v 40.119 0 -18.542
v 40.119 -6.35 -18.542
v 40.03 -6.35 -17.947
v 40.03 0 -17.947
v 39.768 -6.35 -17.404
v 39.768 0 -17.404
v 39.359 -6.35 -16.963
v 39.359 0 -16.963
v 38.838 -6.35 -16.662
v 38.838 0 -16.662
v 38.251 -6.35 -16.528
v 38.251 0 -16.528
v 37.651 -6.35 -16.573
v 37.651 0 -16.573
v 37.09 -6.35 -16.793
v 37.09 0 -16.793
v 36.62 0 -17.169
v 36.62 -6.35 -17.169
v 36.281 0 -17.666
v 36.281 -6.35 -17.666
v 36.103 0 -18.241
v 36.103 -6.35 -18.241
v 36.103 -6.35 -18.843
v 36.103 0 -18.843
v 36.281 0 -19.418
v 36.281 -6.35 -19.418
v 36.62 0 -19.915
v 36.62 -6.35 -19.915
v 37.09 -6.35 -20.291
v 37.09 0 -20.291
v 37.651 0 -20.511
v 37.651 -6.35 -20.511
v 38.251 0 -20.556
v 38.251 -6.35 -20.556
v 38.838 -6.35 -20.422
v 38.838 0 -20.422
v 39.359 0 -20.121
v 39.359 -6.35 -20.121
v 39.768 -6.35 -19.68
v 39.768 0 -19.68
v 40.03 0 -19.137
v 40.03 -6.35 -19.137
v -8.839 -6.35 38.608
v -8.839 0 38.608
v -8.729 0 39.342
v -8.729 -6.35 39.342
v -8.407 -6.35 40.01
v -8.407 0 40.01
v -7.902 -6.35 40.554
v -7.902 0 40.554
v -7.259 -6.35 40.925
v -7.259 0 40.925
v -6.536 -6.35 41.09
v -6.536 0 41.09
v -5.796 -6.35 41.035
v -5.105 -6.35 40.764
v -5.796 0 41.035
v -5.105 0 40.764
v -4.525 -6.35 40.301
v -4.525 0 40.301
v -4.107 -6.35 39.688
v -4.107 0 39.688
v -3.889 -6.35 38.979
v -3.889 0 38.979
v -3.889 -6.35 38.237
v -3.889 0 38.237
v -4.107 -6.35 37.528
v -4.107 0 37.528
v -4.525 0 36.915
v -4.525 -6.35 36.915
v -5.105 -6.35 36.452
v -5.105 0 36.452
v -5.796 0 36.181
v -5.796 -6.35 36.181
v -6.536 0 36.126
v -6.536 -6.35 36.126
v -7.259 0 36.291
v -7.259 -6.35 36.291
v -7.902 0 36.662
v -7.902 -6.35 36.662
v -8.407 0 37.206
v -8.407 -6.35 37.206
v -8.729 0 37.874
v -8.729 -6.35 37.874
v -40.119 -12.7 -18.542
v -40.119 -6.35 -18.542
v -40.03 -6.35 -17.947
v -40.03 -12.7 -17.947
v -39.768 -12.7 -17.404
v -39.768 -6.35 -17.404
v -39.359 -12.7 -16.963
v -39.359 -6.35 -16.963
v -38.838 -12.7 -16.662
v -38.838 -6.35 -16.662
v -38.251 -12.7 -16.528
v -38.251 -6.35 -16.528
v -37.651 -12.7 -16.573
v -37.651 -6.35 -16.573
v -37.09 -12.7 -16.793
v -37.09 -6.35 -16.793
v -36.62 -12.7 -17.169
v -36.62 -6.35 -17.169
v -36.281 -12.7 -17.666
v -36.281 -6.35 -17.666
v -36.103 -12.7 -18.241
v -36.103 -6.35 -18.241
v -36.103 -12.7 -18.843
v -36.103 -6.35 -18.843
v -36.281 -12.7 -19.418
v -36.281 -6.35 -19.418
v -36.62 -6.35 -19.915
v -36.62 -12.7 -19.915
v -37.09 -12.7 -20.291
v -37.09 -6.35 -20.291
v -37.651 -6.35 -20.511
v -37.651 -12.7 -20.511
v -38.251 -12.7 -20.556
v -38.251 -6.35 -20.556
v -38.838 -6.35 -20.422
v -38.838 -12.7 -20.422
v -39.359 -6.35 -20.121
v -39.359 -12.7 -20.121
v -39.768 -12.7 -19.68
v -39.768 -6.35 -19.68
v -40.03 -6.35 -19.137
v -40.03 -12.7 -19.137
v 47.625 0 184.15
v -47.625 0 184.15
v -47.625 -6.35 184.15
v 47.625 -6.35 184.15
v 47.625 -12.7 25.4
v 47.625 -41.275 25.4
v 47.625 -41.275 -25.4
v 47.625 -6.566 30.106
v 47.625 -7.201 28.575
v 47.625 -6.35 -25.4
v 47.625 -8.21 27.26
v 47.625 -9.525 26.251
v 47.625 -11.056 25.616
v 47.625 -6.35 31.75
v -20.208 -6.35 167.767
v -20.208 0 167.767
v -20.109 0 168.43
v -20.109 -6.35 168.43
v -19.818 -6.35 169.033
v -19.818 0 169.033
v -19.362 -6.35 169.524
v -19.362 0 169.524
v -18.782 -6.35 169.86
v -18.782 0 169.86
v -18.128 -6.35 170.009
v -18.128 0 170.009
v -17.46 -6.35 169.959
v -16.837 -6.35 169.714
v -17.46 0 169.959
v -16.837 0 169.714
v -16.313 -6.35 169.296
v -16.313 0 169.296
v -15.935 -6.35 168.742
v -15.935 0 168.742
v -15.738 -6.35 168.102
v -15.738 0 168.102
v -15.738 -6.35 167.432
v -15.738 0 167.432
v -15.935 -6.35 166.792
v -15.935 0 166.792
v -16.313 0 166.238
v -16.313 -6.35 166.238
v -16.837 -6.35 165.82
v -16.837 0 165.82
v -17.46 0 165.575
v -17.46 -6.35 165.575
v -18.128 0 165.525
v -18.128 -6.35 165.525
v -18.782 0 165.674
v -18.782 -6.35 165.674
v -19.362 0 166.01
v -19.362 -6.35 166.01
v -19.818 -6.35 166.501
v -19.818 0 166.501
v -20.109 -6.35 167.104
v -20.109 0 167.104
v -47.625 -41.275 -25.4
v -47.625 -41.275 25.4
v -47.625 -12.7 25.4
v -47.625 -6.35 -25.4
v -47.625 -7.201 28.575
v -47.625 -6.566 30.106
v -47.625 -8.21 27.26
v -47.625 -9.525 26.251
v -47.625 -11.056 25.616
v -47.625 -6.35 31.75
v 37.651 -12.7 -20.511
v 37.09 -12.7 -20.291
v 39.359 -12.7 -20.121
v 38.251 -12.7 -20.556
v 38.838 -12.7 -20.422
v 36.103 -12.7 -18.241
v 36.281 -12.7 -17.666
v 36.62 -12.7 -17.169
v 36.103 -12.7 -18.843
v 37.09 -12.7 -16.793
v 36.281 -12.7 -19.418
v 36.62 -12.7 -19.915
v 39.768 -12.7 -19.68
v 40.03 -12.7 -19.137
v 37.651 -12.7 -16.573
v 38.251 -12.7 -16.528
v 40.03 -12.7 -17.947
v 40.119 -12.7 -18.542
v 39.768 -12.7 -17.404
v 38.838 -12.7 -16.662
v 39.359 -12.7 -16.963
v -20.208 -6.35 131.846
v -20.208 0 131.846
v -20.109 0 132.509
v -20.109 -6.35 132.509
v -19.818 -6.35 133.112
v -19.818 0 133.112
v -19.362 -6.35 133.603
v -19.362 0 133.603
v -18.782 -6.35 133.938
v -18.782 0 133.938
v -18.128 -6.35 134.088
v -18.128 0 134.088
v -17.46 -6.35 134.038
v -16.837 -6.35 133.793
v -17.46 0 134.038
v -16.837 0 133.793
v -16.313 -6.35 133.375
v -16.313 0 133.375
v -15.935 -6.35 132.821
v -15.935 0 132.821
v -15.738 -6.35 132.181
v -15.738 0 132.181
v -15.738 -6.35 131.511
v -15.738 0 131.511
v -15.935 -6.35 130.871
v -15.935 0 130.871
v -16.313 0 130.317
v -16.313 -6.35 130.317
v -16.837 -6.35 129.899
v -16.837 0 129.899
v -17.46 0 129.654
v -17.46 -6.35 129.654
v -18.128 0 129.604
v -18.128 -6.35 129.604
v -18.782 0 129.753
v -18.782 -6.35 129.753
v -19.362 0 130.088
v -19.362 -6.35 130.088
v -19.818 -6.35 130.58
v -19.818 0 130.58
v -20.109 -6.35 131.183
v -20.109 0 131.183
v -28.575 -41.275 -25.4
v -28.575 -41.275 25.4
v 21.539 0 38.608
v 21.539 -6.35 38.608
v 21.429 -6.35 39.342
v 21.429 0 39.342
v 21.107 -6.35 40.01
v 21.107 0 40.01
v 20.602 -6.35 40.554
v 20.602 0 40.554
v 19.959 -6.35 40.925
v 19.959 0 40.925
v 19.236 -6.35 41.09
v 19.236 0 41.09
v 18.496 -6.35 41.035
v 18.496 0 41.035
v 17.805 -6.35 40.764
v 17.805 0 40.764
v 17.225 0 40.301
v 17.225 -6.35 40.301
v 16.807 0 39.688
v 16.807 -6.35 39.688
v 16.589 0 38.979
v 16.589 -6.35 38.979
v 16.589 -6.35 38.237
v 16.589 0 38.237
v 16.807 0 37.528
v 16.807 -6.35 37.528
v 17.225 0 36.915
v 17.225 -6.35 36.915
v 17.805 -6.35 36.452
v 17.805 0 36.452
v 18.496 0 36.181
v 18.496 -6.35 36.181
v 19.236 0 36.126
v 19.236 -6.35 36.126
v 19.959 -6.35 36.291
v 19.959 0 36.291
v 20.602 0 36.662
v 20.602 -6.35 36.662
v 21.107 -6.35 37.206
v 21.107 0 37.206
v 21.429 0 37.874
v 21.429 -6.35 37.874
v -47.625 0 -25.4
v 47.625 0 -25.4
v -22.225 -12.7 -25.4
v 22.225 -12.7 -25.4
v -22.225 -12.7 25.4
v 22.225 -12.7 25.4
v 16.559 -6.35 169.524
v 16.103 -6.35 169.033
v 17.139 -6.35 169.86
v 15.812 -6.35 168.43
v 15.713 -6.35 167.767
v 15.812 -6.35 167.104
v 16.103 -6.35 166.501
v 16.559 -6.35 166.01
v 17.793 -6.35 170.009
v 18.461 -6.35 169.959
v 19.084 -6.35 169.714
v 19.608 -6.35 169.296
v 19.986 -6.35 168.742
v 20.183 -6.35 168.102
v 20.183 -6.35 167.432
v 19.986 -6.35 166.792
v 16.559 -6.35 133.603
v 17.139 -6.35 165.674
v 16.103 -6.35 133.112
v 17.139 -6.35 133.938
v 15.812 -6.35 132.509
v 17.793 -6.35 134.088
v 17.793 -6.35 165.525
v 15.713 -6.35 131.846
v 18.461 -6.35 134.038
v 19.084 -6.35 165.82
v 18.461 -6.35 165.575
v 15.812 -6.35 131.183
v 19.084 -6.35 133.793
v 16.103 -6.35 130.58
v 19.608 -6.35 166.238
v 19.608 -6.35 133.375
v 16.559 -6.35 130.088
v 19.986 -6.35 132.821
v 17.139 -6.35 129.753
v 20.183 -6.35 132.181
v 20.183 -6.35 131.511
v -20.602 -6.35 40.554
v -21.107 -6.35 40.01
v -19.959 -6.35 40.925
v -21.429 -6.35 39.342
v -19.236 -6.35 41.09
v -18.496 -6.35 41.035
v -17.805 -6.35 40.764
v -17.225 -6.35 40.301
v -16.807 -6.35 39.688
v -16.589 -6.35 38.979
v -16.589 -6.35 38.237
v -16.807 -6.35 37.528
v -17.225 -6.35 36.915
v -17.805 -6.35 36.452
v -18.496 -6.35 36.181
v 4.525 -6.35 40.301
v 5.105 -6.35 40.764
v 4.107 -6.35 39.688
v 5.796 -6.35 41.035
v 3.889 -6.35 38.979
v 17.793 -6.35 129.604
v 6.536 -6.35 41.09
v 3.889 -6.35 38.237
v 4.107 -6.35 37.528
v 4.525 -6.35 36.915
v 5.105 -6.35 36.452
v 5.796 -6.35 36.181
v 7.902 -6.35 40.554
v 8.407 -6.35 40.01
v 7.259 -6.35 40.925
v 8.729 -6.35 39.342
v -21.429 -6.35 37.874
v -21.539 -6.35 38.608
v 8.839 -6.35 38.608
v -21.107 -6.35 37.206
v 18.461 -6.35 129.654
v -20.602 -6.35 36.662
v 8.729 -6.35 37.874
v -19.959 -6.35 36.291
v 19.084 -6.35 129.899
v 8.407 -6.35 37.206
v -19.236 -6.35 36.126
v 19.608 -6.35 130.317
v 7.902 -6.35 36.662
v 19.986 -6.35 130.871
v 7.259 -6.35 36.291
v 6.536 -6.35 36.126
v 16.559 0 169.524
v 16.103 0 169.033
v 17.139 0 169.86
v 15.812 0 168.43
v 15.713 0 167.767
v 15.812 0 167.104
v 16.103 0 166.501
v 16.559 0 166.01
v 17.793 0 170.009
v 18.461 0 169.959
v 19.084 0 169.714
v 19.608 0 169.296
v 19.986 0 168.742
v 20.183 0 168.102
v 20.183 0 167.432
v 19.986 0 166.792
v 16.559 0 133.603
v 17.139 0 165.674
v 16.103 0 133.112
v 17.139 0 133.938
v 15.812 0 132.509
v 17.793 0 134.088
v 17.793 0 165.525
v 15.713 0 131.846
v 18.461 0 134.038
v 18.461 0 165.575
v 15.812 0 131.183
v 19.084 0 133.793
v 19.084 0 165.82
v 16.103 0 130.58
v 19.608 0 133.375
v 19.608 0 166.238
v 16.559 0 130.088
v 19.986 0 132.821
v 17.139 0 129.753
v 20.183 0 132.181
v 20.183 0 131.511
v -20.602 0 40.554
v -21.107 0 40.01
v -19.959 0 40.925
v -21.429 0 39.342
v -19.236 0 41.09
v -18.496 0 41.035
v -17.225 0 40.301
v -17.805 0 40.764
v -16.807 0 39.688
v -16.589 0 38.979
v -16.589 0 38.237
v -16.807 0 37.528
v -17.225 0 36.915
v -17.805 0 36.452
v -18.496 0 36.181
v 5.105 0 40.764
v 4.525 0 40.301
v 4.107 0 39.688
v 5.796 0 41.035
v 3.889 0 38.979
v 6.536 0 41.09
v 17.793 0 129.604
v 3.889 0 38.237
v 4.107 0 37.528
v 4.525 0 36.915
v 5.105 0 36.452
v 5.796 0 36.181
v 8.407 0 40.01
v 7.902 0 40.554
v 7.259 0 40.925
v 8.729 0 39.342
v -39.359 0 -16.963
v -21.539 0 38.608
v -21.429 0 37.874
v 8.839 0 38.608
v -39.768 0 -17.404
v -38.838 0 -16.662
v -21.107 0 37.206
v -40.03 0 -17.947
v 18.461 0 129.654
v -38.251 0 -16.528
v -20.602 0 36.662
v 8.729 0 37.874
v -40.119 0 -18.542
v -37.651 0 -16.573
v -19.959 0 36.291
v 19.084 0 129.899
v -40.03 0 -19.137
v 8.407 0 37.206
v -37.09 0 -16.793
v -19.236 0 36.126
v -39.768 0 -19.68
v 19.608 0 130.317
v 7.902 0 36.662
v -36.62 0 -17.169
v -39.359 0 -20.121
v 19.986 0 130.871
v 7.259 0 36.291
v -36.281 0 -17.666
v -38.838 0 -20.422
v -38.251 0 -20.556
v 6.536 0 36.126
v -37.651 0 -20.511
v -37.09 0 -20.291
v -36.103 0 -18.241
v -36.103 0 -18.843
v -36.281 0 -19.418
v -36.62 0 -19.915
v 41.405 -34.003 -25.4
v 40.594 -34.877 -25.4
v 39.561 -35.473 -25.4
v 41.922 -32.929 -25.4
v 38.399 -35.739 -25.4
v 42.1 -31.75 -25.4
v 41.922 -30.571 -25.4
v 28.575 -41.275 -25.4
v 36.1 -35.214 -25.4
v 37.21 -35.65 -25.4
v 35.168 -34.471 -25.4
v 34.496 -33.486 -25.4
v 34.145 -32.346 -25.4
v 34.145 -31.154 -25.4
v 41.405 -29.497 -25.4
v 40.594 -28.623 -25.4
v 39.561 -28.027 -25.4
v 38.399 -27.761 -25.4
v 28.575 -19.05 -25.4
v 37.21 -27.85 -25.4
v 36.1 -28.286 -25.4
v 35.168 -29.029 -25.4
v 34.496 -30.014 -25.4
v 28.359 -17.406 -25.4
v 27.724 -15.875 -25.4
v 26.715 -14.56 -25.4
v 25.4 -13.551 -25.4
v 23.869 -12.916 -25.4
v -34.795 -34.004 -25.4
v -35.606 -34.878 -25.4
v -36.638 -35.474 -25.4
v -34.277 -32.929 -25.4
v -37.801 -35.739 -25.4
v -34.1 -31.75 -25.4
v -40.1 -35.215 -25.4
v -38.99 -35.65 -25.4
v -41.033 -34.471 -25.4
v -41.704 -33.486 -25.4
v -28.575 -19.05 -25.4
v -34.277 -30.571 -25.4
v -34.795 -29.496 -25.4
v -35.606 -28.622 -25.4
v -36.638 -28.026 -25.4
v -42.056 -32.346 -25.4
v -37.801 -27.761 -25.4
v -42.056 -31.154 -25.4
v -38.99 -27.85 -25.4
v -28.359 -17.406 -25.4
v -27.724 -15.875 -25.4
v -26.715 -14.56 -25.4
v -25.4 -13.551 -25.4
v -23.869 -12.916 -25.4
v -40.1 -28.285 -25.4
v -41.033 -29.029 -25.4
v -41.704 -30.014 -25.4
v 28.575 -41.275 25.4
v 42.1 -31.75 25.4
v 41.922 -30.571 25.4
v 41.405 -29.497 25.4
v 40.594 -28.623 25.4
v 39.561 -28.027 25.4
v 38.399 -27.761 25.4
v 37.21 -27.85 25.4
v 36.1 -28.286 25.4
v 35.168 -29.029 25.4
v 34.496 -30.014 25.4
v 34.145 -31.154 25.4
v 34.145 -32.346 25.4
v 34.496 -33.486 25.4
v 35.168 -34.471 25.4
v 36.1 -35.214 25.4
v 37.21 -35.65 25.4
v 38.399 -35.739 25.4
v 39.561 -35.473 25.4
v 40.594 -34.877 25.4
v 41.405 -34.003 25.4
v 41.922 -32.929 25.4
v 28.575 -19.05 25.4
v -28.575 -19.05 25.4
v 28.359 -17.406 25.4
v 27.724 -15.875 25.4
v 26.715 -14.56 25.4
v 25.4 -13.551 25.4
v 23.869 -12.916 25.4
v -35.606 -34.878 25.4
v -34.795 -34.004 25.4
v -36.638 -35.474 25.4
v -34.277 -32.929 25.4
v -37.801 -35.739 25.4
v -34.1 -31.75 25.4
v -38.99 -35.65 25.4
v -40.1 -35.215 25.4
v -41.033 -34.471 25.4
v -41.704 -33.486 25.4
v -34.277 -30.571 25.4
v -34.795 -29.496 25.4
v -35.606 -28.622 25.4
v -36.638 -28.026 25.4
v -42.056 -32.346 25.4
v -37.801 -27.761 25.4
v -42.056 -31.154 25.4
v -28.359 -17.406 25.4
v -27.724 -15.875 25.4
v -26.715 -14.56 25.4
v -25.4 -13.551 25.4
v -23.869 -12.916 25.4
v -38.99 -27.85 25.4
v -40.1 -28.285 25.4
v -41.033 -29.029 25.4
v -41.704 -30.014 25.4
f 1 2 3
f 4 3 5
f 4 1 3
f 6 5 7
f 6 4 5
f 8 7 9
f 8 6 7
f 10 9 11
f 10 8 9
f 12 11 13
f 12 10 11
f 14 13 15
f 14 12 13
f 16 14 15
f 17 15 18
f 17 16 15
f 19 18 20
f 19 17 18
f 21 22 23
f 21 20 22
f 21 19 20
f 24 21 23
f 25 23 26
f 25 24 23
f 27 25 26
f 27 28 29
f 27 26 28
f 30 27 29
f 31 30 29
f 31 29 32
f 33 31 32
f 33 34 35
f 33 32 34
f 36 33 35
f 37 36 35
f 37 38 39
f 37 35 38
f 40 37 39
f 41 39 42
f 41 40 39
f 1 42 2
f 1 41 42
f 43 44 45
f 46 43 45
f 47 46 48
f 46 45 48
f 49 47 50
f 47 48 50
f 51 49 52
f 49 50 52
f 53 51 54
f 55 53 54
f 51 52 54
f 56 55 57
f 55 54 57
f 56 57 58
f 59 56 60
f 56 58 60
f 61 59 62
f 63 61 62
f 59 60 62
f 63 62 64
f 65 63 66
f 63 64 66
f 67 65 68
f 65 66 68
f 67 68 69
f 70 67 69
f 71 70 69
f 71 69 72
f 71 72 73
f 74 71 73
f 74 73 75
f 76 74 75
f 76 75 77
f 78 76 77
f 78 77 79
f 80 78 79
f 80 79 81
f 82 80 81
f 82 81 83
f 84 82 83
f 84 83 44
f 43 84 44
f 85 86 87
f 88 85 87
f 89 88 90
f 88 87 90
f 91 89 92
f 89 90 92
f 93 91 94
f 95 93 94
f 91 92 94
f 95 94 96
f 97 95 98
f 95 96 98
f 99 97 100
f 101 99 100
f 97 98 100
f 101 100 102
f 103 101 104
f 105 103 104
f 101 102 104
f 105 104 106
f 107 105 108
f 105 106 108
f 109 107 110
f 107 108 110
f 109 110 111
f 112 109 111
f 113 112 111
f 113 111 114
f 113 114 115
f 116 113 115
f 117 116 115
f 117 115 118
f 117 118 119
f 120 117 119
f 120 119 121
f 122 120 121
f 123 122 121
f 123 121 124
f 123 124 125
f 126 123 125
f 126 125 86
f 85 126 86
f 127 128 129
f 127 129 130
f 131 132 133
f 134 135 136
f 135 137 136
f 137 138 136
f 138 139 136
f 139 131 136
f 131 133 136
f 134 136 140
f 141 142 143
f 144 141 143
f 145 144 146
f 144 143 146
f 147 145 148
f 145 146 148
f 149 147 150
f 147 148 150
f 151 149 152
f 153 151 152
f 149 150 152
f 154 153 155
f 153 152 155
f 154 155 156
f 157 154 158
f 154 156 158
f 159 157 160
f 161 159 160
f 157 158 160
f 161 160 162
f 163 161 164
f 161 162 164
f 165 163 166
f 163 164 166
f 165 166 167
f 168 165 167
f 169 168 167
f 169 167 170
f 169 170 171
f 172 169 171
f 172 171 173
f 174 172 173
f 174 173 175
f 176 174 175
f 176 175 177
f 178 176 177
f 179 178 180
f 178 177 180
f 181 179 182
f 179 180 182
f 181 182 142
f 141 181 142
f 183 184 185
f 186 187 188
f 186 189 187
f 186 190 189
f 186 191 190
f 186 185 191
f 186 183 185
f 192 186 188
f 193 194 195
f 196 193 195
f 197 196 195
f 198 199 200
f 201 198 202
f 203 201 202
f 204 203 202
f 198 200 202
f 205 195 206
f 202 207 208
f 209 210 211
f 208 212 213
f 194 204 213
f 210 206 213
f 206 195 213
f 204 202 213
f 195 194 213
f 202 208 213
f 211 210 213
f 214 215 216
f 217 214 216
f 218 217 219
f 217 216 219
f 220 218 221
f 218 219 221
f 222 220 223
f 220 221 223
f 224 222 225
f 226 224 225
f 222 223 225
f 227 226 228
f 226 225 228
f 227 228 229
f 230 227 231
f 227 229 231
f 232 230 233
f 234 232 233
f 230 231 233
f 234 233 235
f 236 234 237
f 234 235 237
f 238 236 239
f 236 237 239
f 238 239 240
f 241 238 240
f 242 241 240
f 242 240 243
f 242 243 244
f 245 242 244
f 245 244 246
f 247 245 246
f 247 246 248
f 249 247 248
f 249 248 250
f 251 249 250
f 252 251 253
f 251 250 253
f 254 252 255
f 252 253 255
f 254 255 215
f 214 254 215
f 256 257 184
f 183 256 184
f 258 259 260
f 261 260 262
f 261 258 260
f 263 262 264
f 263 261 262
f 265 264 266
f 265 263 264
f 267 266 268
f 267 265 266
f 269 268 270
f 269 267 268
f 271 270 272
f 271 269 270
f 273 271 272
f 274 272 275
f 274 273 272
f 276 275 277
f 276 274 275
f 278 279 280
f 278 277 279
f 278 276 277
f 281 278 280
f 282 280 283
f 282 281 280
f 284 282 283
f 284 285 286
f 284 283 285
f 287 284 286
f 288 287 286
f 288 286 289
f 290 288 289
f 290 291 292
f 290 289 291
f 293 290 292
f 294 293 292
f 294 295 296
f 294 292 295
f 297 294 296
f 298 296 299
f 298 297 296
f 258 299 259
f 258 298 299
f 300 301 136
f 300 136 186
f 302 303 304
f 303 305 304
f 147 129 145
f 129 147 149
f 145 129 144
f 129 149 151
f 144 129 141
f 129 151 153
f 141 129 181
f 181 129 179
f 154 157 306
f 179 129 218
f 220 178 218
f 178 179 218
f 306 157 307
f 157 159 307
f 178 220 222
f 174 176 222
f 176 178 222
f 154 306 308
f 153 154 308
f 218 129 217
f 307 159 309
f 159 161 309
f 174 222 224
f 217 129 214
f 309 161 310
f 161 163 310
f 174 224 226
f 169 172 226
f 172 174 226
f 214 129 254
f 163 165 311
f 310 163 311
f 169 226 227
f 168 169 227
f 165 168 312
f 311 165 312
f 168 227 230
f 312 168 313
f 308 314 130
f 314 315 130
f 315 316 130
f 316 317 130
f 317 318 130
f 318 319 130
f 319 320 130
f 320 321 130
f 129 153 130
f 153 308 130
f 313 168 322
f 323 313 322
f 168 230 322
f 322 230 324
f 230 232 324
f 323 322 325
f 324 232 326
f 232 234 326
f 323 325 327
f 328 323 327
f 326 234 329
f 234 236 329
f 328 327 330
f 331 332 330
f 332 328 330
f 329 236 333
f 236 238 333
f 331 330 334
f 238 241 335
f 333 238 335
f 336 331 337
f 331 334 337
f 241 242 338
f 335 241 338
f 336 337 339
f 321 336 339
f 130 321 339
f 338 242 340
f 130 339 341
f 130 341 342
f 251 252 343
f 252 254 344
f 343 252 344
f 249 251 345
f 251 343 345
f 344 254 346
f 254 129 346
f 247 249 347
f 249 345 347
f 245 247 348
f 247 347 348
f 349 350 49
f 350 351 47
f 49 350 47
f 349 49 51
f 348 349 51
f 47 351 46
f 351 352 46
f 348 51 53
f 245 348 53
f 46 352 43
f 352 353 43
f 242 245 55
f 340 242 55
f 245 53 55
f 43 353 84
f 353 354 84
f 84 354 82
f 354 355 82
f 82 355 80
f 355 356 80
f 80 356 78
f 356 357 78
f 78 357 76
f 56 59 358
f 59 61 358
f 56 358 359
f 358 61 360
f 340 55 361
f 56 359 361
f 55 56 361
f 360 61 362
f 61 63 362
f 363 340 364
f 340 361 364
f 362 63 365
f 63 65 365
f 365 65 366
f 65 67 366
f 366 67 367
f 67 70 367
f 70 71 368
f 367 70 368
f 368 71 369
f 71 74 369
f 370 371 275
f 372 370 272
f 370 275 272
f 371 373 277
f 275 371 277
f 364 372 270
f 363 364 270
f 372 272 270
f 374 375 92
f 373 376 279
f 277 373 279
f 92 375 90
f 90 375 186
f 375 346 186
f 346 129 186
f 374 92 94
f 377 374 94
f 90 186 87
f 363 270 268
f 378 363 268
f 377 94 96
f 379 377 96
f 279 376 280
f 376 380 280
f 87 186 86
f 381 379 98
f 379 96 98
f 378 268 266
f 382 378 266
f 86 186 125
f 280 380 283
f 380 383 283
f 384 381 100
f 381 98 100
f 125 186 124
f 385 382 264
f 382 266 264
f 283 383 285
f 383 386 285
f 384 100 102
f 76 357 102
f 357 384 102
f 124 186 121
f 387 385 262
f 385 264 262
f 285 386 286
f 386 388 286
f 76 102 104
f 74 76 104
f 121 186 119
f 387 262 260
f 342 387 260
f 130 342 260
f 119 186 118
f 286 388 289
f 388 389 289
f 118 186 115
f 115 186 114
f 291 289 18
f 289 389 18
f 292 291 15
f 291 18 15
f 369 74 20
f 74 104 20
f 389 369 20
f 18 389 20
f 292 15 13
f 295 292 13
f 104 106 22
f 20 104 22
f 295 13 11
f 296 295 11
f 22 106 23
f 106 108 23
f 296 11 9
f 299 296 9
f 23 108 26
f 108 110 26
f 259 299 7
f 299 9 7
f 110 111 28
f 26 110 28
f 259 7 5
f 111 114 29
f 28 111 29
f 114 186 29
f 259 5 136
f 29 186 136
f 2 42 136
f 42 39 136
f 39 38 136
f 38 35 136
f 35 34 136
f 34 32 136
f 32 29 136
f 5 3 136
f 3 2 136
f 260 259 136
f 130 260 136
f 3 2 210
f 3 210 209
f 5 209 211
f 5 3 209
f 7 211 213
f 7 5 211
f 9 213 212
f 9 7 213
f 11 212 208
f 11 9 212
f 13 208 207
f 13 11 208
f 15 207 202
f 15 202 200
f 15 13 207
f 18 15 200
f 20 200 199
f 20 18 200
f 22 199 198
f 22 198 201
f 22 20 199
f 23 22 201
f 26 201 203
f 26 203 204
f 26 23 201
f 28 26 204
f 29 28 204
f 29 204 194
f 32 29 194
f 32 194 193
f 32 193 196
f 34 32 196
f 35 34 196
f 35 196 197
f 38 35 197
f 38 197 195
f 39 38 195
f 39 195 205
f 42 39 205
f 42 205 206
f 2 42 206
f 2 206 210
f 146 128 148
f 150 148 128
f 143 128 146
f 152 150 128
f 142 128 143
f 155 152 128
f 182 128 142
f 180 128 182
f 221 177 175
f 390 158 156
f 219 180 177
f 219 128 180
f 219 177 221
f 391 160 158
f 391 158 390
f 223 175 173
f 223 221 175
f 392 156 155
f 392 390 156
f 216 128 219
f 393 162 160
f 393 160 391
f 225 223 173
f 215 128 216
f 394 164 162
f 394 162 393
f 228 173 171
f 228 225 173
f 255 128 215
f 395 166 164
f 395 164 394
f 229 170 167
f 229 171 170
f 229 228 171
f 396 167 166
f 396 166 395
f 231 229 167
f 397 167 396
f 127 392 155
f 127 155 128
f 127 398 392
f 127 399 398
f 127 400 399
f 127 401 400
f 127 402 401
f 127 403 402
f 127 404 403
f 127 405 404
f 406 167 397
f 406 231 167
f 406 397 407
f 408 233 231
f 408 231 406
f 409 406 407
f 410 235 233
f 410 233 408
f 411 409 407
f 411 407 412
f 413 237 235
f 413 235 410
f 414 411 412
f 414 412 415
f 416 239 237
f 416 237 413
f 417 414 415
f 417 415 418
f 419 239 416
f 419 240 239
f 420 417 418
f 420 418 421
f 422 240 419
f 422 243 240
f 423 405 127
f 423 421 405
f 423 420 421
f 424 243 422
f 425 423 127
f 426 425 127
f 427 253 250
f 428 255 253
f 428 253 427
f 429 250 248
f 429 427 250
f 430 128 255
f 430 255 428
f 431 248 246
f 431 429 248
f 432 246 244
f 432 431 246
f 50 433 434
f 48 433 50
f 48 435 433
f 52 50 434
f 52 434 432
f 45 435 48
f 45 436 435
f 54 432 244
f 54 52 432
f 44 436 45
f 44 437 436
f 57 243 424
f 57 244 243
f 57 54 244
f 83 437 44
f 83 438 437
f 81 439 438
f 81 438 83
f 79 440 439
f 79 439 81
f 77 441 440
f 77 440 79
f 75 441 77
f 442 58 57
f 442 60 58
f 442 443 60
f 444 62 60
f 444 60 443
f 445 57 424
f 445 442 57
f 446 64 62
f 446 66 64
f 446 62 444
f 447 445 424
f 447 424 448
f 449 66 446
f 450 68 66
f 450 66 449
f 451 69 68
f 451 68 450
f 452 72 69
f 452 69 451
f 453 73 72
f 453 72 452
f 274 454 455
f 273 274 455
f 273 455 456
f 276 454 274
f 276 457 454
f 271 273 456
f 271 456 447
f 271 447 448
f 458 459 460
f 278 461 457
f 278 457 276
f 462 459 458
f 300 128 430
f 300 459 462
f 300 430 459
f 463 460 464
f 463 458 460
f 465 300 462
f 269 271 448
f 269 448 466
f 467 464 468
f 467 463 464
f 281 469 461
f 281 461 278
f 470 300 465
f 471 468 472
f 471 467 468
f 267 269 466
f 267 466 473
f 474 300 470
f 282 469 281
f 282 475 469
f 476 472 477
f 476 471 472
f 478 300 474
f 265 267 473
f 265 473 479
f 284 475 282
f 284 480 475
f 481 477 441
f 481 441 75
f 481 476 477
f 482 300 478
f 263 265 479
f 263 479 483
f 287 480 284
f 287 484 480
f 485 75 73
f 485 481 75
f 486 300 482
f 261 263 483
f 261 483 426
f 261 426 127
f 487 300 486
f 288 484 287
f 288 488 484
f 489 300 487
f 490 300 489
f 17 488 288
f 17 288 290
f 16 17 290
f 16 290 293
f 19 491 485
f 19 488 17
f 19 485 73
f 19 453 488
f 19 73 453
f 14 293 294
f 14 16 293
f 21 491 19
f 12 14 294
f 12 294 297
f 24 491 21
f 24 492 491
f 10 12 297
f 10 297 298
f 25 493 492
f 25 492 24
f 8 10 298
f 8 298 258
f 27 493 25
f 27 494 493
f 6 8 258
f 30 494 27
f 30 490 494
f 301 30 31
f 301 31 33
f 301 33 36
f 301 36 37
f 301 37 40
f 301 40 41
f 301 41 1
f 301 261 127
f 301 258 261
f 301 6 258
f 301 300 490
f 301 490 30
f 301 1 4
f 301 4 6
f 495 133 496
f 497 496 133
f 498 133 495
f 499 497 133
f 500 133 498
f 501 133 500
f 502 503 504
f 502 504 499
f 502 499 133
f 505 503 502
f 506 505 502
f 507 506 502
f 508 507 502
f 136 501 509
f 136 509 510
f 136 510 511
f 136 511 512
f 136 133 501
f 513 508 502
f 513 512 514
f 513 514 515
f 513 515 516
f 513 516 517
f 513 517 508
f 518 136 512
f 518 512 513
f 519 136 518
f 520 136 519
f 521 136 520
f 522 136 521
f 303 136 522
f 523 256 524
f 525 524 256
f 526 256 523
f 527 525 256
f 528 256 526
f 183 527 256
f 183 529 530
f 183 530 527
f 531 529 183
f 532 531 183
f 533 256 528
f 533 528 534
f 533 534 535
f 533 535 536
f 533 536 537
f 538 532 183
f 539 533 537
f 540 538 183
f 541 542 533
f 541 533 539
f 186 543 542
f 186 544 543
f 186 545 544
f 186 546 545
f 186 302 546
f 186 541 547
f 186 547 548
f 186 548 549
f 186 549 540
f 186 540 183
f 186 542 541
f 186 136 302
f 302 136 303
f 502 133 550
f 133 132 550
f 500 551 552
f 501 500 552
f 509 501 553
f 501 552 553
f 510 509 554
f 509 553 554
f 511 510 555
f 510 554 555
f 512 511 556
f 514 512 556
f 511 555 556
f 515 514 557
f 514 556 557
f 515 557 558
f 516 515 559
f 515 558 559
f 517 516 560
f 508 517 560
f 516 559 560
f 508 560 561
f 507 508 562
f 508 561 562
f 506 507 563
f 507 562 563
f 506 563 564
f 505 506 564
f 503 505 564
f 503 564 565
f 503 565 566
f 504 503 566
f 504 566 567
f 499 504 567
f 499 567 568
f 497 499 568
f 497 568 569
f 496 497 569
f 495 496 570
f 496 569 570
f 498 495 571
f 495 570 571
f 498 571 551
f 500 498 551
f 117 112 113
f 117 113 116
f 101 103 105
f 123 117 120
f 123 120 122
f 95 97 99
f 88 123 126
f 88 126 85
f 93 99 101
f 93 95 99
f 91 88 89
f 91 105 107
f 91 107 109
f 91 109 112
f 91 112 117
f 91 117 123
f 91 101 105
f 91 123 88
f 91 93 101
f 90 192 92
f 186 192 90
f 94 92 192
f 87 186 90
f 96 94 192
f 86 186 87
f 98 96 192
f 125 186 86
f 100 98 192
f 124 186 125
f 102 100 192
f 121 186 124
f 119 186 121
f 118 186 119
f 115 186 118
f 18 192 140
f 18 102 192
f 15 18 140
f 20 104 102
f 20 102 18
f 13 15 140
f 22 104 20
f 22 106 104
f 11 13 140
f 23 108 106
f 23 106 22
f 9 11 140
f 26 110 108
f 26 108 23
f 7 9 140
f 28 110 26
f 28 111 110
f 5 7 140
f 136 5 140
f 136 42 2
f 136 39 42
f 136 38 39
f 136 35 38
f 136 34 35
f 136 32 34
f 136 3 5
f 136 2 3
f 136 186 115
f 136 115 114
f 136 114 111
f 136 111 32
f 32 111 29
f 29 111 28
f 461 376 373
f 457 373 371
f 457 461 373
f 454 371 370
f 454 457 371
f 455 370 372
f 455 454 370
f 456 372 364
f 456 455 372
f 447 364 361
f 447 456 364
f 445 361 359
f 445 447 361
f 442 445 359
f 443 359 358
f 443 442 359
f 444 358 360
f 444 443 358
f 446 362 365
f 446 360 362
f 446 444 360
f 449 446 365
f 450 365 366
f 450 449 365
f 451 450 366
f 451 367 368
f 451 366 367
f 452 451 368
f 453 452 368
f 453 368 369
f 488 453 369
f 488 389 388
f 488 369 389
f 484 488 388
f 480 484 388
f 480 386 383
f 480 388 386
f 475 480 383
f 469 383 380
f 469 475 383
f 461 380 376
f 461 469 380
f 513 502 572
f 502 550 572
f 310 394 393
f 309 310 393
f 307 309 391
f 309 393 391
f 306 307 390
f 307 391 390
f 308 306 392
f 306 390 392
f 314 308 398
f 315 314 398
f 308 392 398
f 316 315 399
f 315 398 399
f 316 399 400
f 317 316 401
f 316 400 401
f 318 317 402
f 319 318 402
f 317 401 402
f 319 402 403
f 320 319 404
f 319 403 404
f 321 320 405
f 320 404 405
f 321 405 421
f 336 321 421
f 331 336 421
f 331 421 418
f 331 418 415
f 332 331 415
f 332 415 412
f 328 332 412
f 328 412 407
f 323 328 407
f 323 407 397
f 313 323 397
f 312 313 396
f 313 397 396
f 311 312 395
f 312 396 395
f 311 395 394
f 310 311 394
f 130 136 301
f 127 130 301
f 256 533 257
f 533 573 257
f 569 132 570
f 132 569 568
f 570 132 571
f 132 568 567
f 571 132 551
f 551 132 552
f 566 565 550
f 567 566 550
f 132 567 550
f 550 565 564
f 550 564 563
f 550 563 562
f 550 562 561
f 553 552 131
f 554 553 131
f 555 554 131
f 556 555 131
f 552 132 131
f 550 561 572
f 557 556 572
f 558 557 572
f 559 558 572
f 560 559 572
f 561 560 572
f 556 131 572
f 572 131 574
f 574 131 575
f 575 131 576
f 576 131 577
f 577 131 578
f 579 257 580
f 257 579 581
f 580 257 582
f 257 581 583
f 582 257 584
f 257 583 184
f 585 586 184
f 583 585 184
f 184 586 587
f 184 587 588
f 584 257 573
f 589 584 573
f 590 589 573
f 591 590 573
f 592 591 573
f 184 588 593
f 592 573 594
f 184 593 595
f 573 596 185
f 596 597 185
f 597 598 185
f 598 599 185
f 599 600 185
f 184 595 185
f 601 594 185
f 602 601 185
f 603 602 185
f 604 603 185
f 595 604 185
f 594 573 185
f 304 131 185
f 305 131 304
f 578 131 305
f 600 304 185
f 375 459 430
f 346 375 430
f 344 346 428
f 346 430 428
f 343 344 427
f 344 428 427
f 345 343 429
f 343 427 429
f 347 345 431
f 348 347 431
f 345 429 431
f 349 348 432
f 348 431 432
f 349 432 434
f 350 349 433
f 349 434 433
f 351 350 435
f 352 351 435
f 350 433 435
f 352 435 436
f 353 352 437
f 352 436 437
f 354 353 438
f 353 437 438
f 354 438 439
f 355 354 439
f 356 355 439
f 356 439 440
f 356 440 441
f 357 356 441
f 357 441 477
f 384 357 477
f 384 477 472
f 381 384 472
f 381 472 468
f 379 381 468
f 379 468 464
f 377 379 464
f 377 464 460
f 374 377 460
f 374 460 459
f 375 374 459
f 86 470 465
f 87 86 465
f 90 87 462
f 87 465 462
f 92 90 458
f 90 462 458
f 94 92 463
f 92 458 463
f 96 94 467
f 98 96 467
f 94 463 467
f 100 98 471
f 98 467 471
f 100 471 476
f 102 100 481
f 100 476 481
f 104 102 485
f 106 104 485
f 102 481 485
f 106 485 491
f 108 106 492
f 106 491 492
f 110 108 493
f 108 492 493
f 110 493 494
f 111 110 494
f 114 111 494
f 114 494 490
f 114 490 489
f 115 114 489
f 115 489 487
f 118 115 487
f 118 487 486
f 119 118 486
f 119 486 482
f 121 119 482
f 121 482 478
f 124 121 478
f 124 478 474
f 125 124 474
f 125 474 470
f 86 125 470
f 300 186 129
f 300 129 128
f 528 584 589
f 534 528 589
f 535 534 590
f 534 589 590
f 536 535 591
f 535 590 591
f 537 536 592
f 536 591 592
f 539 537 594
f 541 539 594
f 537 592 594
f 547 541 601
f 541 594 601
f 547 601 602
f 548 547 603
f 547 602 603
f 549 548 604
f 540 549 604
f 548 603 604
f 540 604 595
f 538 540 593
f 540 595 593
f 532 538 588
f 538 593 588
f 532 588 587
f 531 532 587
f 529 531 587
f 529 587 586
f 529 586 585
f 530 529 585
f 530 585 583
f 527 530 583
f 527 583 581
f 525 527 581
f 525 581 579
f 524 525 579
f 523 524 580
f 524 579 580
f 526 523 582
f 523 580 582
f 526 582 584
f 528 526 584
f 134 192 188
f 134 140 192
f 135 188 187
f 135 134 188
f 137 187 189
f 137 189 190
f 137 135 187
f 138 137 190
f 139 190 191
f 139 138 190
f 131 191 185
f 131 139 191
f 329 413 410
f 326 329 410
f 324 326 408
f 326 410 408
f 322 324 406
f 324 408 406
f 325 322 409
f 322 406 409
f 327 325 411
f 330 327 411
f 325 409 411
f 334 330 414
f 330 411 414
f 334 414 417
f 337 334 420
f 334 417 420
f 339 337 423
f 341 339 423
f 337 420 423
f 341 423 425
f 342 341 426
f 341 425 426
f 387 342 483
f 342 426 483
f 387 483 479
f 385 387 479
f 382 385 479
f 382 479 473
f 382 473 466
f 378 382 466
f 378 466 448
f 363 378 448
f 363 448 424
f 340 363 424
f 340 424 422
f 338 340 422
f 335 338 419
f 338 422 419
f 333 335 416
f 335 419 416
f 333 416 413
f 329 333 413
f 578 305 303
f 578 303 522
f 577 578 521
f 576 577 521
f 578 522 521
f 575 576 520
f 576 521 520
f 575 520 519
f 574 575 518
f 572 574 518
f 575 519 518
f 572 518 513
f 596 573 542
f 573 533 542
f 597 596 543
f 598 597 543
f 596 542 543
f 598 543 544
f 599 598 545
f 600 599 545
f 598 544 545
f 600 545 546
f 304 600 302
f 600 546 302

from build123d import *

# Parameters (mm, degrees)
BOSS_EXTRUDE1_DEPTH = 25.4
FILLET1_R           = 6.35
SKETCH2_R           = 4.0005
SKETCH2_R_2         = 4
CUT_EXTRUDE1_DEPTH  = 50.8
SKETCH4_W           = 95.25
SKETCH4_H           = 6.35
BOSS_EXTRUDE3_DEPTH = 158.75
SKETCH5_R           = 2.0193
CUT_EXTRUDE2_DEPTH  = 12.7
FILLET2_R           = 6.35
SKETCH6_R           = 2.2479
CUT_EXTRUDE3_DEPTH  = 6.35
SKETCH10_R          = 2.4892
CUT_EXTRUDE4_DEPTH  = 195.635527975


# Read off the part's stored shape, not the designer's step: Split1
with BuildPart() as part:
    # Sketch1 → Boss-Extrude1 (new, symmetric)
    with BuildSketch(Plane.XY):
        Polygon((-47.625, 0), (47.625, 0), (47.625, -41.275), (28.575, -41.275), (28.575, -12.7), (-28.575, -12.7), (-28.575, -41.275), (-47.625, -41.275), align=None)
    extrude(amount=BOSS_EXTRUDE1_DEPTH, both=True)

    # Fillet1
    fillet1_edges = [part.edges().sort_by_distance(p)[0] for p in [
        (28.575, -12.7, 0),
        (-28.575, -12.7, 0),
    ]]
    fillet(fillet1_edges, radius=FILLET1_R)

    # Sketch2 → Cut-Extrude1 (cut)
    with BuildSketch(Plane.XY.offset(25.4)):
        with Locations((-38.1, -31.75)):
            Circle(SKETCH2_R)
        with Locations((38.1, -31.75)):
            Circle(SKETCH2_R_2)
    extrude(amount=-CUT_EXTRUDE1_DEPTH, mode=Mode.SUBTRACT)

    # Sketch4 → Boss-Extrude3 (add)
    with BuildSketch(Plane.XY.offset(25.4)):
        with Locations((0, -3.175)):
            Rectangle(SKETCH4_W, SKETCH4_H)
    extrude(amount=BOSS_EXTRUDE3_DEPTH)

    # Sketch5 → Cut-Extrude2 (cut)
    with BuildSketch(Plane(origin=(0, 0, 0), x_dir=(1, 0, 0), z_dir=(0, 1, 0))):
        with Locations(Location((-38.1, 18.542, 0), (0, 0, 180))):
            Circle(SKETCH5_R)
    cut_extrude2 = extrude(amount=-CUT_EXTRUDE2_DEPTH, mode=Mode.SUBTRACT)

    # Mirror1: Cut-Extrude2 across plane
    add(cut_extrude2.mirror(Plane(origin=(0, 0, 0), x_dir=(0, 0, 1), z_dir=(1, 0, 0))), mode=Mode.SUBTRACT)

    # Fillet2
    fillet2_edges = [part.edges().sort_by_distance(p)[0] for p in [
        (0, -6.35, 25.4),
    ]]
    fillet(fillet2_edges, radius=FILLET2_R - 0.0001)  # a hair under: the kernel refuses the full size

    # Sketch6 → Cut-Extrude3 (cut)
    with BuildSketch(Plane(origin=(0, 0, 0), x_dir=(1, 0, 0), z_dir=(0, 1, 0))):
        with Locations(Location((-17.960512242, -167.767, 0), (0, 0, 180))):
            Circle(SKETCH6_R)
        with Locations(Location((-17.960512242, -131.845975516, 0), (0, 0, 180))):
            Circle(SKETCH6_R)
        with Locations(Location((17.960512242, -167.767, 0), (0, 0, 180))):
            Circle(SKETCH6_R)
        with Locations(Location((17.960512242, -131.845975516, 0), (0, 0, 180))):
            Circle(SKETCH6_R)
    extrude(amount=-CUT_EXTRUDE3_DEPTH, mode=Mode.SUBTRACT)

    # Sketch10 → Cut-Extrude4 (cut, through all)
    with BuildSketch(Plane(origin=(0, 0, 0), x_dir=(1, 0, 0), z_dir=(0, 1, 0))):
        with Locations(Location((-6.35, -38.608, 0), (0, 0, 180))):
            Circle(SKETCH10_R)
        with Locations(Location((-19.05, -38.608, 0), (0, 0, 180))):
            Circle(SKETCH10_R)
    cut_extrude4 = extrude(amount=-CUT_EXTRUDE4_DEPTH, mode=Mode.SUBTRACT)

    # Mirror2: Cut-Extrude4 across plane
    add(cut_extrude4.mirror(Plane(origin=(0, 0, 0), x_dir=(0, 0, 1), z_dir=(1, 0, 0))), mode=Mode.SUBTRACT)


with BuildPart() as body_2:
    # Split1: the piece on the far side of the plane
    add(part.part)
    split(bisect_by=Plane(origin=(0, -6.35, 0), x_dir=(1, 0, 0), z_dir=(0, 1, 0)), keep=Keep.BOTTOM)


with BuildPart() as part_1:
    add(part.part)

    # Split1
    split(bisect_by=Plane(origin=(0, -6.35, 0), x_dir=(1, 0, 0), z_dir=(0, 1, 0)), keep=Keep.TOP)


solid = Compound([body_2.part, part_1.part])
